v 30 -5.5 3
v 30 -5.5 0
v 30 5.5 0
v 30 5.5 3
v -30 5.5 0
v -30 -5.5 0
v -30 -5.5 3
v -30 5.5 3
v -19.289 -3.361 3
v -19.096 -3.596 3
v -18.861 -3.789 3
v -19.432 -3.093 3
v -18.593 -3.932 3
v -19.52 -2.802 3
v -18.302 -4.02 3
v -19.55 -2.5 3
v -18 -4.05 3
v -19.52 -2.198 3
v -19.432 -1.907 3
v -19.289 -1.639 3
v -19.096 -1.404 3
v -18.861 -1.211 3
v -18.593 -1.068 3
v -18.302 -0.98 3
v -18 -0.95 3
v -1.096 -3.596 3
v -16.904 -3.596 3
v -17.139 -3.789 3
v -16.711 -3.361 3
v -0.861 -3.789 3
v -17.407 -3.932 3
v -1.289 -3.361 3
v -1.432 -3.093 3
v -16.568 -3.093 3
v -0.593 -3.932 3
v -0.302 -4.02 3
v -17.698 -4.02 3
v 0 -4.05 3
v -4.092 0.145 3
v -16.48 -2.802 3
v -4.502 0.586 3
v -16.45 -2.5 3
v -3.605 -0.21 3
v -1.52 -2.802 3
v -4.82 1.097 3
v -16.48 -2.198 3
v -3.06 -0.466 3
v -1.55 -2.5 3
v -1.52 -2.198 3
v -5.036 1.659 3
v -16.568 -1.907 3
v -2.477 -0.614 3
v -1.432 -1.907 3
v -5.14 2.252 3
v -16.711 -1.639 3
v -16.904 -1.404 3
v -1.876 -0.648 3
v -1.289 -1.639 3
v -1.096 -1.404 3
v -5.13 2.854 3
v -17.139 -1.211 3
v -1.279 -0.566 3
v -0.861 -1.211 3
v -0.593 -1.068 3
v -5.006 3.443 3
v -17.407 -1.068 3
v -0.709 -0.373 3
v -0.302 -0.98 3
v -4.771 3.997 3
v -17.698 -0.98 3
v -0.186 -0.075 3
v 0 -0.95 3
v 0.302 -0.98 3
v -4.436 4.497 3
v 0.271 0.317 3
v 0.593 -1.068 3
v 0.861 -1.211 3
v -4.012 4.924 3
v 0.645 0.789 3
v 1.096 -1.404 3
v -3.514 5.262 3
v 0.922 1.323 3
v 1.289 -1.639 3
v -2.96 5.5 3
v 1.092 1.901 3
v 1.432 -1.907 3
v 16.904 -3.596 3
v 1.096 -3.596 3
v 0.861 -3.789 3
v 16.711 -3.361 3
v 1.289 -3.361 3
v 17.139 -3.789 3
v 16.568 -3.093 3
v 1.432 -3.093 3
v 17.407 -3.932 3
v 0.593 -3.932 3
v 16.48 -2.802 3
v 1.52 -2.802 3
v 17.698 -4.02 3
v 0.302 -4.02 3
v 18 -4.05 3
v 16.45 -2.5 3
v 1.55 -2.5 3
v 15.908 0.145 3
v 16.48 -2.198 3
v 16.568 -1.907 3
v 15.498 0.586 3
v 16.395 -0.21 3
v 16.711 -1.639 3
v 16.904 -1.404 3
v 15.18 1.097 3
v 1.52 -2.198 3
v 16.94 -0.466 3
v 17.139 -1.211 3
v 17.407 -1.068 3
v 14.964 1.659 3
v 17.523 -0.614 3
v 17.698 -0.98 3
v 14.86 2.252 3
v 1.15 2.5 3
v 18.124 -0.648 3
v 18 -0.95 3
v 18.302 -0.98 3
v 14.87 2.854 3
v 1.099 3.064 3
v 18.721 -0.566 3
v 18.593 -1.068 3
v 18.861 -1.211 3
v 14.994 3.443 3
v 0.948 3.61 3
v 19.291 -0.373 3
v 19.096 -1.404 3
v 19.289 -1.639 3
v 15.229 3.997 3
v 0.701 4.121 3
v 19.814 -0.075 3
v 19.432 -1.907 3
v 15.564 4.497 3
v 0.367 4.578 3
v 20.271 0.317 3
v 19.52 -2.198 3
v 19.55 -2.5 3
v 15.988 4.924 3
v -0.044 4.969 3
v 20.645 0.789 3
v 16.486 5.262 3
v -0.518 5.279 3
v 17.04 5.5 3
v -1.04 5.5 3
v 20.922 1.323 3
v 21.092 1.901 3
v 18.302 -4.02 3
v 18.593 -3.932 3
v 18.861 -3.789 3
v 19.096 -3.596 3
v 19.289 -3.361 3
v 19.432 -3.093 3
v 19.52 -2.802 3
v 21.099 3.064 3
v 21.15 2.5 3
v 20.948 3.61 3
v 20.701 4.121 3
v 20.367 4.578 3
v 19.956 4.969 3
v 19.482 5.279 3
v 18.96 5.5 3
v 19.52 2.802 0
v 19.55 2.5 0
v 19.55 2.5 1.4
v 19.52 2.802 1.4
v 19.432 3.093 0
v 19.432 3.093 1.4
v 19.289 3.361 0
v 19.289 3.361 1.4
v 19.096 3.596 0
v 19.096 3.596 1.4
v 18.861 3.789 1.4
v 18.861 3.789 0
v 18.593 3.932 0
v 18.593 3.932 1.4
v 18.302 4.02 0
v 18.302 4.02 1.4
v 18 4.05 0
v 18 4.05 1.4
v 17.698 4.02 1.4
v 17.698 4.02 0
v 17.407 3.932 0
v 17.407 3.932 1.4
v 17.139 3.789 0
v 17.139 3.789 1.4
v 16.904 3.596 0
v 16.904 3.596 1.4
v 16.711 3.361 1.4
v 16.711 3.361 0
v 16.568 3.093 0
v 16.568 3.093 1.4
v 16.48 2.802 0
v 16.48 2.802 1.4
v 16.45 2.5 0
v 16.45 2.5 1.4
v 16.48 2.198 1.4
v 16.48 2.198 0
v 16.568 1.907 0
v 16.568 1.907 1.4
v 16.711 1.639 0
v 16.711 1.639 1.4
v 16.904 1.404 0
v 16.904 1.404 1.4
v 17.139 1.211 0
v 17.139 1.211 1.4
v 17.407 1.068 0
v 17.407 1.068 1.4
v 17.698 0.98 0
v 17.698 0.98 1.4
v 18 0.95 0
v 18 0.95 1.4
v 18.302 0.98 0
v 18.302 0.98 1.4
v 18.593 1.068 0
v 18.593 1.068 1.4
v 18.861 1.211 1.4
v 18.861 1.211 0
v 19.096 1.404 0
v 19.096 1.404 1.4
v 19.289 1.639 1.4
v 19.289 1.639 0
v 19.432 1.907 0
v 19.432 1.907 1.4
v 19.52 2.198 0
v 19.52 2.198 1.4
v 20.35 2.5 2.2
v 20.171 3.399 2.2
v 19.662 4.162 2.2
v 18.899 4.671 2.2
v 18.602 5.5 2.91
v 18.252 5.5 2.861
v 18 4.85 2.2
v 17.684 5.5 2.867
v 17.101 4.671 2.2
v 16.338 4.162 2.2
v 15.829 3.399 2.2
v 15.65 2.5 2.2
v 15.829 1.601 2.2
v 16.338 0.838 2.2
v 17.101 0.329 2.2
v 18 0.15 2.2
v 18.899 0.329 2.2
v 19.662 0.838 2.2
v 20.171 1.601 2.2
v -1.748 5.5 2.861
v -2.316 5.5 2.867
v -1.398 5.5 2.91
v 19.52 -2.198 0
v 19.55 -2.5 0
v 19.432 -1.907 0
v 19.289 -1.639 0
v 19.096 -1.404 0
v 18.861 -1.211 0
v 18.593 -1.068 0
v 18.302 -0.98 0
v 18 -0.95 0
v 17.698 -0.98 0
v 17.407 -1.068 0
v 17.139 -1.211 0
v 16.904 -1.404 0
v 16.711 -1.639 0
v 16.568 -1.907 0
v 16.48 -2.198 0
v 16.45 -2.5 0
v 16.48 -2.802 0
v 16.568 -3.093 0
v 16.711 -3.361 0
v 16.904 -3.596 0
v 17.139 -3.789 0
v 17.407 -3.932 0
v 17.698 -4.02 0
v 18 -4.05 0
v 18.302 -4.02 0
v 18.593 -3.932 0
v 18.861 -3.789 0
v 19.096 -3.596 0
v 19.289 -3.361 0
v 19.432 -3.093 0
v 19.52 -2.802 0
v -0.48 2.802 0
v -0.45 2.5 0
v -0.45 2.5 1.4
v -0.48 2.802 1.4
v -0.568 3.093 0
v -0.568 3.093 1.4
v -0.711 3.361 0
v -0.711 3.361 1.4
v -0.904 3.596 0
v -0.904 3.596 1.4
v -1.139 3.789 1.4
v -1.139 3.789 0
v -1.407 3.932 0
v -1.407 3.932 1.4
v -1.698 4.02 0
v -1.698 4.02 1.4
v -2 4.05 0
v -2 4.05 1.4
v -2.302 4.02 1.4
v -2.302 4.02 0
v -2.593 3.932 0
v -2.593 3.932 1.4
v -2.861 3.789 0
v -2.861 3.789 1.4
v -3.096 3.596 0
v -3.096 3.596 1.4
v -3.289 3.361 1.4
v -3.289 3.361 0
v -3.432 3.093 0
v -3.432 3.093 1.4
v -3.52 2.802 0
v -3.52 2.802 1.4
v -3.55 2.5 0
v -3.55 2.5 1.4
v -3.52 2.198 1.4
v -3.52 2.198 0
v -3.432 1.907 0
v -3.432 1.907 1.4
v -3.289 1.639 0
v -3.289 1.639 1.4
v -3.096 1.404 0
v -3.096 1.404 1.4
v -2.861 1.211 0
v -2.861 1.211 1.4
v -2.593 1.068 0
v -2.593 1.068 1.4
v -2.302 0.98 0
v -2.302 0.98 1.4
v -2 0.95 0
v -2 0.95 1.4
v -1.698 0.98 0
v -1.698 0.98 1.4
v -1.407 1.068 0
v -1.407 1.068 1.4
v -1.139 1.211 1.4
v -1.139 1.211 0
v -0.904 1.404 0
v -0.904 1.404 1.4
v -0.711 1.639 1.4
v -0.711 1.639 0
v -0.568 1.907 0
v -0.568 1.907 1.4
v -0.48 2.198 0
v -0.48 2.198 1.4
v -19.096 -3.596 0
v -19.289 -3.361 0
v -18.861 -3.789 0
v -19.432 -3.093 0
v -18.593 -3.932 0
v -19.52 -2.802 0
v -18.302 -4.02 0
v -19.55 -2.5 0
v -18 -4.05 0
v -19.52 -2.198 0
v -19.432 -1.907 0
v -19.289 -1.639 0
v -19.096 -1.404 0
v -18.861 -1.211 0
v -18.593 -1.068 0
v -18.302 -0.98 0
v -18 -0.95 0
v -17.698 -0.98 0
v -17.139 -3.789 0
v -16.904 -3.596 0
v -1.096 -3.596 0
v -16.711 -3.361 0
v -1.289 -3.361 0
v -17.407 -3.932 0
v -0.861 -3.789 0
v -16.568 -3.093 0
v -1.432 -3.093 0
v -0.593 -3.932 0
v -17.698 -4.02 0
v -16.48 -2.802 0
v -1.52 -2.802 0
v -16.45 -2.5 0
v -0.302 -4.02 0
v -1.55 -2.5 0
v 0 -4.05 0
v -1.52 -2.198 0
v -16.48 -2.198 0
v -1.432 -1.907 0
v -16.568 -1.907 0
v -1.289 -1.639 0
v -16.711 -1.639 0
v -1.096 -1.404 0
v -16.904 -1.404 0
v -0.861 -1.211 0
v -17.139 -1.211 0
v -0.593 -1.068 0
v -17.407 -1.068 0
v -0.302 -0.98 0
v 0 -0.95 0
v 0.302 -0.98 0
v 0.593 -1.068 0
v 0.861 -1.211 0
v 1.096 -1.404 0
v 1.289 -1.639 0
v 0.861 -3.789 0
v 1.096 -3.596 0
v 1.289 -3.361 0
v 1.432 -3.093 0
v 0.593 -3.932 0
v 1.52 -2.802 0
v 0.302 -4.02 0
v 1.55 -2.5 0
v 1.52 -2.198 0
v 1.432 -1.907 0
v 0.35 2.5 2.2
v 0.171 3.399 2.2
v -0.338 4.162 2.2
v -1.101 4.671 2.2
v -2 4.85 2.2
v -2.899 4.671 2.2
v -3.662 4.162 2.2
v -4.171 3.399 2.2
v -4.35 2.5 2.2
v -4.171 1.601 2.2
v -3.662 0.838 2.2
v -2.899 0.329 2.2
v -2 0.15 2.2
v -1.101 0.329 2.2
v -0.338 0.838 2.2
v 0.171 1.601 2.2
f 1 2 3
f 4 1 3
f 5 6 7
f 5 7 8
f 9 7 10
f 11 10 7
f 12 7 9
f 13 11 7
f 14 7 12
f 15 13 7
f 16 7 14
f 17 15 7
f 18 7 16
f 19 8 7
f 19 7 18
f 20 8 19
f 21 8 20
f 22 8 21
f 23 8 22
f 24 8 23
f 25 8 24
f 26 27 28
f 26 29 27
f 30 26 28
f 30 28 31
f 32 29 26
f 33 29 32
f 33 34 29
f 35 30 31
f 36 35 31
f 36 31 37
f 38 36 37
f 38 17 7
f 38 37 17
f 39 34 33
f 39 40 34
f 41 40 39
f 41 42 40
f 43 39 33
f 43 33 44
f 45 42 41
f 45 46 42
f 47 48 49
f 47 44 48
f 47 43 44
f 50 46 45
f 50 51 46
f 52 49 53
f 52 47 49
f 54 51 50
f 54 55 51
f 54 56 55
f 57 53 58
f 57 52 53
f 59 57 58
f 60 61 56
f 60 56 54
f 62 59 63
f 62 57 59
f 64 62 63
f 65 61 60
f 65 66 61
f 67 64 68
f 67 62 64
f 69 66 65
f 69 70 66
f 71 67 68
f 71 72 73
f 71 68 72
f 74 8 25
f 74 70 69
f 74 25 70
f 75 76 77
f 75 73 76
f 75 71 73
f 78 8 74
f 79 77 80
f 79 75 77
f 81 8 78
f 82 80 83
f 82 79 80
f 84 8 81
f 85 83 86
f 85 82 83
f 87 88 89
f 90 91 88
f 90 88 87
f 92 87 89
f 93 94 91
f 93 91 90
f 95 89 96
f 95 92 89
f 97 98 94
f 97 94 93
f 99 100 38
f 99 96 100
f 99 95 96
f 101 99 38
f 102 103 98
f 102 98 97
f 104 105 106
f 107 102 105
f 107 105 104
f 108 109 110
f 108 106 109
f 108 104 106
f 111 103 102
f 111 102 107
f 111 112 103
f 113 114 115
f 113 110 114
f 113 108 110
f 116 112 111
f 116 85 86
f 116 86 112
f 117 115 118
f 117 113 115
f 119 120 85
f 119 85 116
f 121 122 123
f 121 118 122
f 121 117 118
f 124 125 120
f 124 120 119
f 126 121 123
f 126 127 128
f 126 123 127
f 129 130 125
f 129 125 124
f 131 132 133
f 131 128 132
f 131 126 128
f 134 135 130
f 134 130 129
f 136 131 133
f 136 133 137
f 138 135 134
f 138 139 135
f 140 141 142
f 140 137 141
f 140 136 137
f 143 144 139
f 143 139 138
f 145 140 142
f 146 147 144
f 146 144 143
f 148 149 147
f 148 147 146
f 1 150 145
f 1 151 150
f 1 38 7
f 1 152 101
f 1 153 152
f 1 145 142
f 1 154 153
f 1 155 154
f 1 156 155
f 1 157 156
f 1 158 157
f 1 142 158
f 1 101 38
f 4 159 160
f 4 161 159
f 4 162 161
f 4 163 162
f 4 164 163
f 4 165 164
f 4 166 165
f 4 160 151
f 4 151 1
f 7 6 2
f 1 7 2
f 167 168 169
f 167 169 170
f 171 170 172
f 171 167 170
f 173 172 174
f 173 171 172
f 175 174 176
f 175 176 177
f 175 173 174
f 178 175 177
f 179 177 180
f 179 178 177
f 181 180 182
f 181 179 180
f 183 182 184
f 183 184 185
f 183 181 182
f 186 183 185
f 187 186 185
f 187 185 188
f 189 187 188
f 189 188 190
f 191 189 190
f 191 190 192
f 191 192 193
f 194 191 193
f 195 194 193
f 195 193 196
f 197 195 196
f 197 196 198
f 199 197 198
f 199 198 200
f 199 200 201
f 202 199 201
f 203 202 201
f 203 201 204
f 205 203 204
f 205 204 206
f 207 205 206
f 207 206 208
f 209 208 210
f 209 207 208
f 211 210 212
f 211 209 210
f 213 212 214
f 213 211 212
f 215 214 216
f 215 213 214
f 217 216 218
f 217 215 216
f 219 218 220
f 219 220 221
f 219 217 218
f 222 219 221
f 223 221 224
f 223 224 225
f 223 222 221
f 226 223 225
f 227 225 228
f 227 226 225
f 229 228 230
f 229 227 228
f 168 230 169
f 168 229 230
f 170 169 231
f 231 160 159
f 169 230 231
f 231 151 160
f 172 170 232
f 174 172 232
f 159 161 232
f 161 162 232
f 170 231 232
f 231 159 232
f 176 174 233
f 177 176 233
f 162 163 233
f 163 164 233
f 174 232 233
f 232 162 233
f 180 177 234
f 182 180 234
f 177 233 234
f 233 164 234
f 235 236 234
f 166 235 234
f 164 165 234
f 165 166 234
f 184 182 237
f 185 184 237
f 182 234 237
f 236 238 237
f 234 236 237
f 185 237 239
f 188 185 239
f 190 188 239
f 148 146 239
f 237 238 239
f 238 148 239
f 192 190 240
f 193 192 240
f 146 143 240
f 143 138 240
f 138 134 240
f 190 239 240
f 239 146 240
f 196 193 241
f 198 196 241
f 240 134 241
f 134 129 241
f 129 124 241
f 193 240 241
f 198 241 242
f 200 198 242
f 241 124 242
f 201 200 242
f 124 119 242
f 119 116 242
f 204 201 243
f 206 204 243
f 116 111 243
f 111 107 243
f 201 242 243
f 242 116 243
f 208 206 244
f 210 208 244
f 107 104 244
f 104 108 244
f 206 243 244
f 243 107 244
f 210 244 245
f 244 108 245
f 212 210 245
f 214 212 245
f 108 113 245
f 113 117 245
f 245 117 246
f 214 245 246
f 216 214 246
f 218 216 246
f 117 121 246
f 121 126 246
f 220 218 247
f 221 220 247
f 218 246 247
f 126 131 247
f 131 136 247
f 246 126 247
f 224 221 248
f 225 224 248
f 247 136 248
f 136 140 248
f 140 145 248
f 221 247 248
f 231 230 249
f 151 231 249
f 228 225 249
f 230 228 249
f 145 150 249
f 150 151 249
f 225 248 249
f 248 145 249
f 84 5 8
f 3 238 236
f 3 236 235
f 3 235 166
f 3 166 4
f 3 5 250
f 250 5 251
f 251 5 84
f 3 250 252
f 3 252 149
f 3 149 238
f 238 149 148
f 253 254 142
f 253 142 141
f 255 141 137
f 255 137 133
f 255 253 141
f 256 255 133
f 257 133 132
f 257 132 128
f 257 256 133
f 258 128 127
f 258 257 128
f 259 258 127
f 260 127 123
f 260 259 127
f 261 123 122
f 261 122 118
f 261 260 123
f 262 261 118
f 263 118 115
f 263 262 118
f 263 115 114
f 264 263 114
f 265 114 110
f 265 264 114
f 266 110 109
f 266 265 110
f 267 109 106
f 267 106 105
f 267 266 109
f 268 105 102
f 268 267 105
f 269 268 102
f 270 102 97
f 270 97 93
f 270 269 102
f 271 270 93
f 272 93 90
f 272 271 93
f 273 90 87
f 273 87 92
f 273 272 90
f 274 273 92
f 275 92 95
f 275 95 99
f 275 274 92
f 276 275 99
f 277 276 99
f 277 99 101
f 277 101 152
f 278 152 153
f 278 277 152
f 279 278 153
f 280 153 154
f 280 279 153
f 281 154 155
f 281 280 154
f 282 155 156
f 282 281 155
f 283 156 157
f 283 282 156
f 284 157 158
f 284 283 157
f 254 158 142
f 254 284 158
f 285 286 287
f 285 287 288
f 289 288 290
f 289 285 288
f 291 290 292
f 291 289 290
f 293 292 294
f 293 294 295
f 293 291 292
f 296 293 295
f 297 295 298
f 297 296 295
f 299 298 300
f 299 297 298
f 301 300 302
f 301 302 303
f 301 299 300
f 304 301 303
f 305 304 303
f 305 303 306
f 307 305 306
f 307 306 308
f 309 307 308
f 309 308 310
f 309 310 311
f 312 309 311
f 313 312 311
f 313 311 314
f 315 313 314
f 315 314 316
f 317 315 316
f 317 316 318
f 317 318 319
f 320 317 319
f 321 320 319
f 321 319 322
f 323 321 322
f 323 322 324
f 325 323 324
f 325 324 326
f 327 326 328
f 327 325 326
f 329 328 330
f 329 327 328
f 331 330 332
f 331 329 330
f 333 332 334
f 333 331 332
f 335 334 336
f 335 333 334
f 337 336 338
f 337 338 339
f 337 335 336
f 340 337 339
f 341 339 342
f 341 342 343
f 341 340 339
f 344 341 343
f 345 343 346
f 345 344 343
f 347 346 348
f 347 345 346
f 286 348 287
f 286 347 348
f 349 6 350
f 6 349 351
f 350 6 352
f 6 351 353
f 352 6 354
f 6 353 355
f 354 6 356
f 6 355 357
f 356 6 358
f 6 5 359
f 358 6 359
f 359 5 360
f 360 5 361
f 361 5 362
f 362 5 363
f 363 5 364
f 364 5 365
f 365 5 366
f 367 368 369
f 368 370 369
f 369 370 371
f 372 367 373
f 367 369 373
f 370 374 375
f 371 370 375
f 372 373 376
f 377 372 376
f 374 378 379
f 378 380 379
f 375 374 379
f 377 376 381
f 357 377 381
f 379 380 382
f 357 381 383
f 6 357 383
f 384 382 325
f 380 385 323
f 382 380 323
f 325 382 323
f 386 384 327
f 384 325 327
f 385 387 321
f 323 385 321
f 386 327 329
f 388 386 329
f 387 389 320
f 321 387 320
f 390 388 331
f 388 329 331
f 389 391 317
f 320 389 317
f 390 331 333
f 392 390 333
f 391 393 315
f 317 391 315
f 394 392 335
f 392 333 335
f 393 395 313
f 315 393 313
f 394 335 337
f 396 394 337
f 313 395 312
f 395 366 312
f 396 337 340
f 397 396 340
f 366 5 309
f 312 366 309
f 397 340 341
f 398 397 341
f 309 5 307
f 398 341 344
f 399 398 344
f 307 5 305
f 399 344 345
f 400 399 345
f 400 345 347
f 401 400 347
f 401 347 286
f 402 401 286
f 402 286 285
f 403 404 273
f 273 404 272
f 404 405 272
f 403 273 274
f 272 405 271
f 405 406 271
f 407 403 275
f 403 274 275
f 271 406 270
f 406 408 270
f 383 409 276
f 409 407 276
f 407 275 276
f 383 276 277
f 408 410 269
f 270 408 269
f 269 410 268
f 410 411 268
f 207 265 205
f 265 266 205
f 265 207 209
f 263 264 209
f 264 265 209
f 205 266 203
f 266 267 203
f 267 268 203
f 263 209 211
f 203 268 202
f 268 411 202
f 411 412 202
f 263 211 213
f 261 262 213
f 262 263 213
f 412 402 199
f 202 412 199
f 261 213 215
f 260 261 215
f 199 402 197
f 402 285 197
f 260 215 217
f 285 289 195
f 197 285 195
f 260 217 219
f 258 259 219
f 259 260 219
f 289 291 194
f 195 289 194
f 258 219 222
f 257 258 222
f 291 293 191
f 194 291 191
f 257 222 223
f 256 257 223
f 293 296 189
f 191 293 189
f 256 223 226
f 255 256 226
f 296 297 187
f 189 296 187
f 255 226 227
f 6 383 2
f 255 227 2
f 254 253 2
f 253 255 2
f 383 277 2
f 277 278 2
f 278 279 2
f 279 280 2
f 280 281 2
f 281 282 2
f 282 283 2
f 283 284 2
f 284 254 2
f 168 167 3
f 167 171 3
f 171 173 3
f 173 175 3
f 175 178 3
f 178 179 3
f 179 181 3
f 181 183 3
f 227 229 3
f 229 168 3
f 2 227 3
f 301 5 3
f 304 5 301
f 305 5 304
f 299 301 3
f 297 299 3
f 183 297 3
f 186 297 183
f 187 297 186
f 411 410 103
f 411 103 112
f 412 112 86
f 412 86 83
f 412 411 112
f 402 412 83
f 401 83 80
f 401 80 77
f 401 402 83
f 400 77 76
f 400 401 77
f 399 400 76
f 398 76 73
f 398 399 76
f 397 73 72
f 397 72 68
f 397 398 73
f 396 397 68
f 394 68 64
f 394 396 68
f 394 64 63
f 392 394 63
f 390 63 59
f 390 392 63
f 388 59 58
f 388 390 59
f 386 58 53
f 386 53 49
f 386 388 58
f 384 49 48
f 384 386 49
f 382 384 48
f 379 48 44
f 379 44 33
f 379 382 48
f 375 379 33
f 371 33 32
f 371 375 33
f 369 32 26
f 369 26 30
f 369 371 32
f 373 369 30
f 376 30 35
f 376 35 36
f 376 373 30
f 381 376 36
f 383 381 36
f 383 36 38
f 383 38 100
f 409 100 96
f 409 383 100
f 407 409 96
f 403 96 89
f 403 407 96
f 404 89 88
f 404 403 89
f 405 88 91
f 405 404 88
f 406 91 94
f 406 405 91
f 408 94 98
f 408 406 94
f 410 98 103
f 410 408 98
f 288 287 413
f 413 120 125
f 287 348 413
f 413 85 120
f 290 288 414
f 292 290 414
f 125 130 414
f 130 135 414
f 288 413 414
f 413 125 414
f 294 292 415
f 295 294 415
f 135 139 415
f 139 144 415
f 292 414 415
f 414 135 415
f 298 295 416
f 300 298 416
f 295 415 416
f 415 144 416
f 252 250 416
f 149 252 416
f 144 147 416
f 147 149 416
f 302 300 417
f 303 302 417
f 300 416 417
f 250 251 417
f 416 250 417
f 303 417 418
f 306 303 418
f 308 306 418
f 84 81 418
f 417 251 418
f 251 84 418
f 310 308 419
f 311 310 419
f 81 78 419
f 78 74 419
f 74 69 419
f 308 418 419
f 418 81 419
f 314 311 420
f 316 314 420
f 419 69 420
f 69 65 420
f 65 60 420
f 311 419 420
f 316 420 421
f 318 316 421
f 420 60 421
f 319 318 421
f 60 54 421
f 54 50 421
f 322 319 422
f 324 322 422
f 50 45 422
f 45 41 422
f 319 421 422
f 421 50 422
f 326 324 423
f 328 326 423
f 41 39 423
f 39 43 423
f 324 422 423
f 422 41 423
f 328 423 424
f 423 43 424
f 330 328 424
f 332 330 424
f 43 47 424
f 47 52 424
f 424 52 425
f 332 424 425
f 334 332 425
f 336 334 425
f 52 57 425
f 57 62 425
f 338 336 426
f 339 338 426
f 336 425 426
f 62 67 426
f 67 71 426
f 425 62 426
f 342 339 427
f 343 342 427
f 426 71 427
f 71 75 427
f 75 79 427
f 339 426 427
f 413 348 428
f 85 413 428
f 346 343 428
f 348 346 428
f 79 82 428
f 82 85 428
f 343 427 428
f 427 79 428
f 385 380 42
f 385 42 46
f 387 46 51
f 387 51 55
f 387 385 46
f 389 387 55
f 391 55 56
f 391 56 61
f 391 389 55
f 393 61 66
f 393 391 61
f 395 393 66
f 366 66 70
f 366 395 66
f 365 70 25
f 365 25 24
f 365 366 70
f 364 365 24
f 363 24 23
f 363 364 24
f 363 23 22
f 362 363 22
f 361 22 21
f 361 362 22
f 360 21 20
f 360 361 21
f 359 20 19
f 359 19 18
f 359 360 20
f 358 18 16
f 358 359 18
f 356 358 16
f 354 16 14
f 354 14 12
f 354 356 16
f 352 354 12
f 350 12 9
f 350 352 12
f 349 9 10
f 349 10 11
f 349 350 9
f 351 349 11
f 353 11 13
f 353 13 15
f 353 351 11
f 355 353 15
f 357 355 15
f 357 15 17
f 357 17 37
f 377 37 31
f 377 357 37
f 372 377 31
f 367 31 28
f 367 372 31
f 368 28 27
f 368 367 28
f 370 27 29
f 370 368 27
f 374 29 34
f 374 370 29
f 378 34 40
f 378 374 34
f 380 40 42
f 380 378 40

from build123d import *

# Parameters (mm, degrees)
SKETCH_1_W      = 60
SKETCH_1_H      = 11
SKETCH_1_R      = 1.55
EXTRUDE_1_DEPTH = 3
CHAMFER_1_SIZE  = 1.6


with BuildPart() as part:
    # 草图1 → 凸台-拉伸1 (new body)
    with BuildSketch(Plane.XY):
        Rectangle(SKETCH_1_W, SKETCH_1_H)
        with Locations((18, 2.5)):
            Circle(SKETCH_1_R, mode=Mode.SUBTRACT)
        with Locations((-2, 2.5)):
            Circle(SKETCH_1_R, mode=Mode.SUBTRACT)
        with Locations((0, -2.5)):
            Circle(SKETCH_1_R, mode=Mode.SUBTRACT)
        with Locations((18, -2.5)):
            Circle(SKETCH_1_R, mode=Mode.SUBTRACT)
        with Locations((-18, -2.5)):
            Circle(SKETCH_1_R, mode=Mode.SUBTRACT)
    extrude(amount=EXTRUDE_1_DEPTH)

    # 倒角1
    # the kernel refuses this chamfer: 1.6 mm, written as the material it takes off along each edge
    with BuildSketch(Plane(origin=(18, 2.5, 3), x_dir=(1, 0, 0), z_dir=(0, -1, 0))) as chamfer_1_piece_1:
        Polygon((1.55, -CHAMFER_1_SIZE), (1.55 + CHAMFER_1_SIZE, 0), (1.55, 0), align=None)
    revolve(axis=Axis((18, 2.5, 3), (0, 0, 1)), mode=Mode.SUBTRACT)
    with BuildSketch(Plane(origin=(-2, 2.5, 3), x_dir=(1, 0, 0), z_dir=(0, -1, 0))) as chamfer_1_piece_2:
        Polygon((1.55, -CHAMFER_1_SIZE), (1.55 + CHAMFER_1_SIZE, 0), (1.55, 0), align=None)
    revolve(axis=Axis((-2, 2.5, 3), (0, 0, 1)), mode=Mode.SUBTRACT)


solid = part.part
